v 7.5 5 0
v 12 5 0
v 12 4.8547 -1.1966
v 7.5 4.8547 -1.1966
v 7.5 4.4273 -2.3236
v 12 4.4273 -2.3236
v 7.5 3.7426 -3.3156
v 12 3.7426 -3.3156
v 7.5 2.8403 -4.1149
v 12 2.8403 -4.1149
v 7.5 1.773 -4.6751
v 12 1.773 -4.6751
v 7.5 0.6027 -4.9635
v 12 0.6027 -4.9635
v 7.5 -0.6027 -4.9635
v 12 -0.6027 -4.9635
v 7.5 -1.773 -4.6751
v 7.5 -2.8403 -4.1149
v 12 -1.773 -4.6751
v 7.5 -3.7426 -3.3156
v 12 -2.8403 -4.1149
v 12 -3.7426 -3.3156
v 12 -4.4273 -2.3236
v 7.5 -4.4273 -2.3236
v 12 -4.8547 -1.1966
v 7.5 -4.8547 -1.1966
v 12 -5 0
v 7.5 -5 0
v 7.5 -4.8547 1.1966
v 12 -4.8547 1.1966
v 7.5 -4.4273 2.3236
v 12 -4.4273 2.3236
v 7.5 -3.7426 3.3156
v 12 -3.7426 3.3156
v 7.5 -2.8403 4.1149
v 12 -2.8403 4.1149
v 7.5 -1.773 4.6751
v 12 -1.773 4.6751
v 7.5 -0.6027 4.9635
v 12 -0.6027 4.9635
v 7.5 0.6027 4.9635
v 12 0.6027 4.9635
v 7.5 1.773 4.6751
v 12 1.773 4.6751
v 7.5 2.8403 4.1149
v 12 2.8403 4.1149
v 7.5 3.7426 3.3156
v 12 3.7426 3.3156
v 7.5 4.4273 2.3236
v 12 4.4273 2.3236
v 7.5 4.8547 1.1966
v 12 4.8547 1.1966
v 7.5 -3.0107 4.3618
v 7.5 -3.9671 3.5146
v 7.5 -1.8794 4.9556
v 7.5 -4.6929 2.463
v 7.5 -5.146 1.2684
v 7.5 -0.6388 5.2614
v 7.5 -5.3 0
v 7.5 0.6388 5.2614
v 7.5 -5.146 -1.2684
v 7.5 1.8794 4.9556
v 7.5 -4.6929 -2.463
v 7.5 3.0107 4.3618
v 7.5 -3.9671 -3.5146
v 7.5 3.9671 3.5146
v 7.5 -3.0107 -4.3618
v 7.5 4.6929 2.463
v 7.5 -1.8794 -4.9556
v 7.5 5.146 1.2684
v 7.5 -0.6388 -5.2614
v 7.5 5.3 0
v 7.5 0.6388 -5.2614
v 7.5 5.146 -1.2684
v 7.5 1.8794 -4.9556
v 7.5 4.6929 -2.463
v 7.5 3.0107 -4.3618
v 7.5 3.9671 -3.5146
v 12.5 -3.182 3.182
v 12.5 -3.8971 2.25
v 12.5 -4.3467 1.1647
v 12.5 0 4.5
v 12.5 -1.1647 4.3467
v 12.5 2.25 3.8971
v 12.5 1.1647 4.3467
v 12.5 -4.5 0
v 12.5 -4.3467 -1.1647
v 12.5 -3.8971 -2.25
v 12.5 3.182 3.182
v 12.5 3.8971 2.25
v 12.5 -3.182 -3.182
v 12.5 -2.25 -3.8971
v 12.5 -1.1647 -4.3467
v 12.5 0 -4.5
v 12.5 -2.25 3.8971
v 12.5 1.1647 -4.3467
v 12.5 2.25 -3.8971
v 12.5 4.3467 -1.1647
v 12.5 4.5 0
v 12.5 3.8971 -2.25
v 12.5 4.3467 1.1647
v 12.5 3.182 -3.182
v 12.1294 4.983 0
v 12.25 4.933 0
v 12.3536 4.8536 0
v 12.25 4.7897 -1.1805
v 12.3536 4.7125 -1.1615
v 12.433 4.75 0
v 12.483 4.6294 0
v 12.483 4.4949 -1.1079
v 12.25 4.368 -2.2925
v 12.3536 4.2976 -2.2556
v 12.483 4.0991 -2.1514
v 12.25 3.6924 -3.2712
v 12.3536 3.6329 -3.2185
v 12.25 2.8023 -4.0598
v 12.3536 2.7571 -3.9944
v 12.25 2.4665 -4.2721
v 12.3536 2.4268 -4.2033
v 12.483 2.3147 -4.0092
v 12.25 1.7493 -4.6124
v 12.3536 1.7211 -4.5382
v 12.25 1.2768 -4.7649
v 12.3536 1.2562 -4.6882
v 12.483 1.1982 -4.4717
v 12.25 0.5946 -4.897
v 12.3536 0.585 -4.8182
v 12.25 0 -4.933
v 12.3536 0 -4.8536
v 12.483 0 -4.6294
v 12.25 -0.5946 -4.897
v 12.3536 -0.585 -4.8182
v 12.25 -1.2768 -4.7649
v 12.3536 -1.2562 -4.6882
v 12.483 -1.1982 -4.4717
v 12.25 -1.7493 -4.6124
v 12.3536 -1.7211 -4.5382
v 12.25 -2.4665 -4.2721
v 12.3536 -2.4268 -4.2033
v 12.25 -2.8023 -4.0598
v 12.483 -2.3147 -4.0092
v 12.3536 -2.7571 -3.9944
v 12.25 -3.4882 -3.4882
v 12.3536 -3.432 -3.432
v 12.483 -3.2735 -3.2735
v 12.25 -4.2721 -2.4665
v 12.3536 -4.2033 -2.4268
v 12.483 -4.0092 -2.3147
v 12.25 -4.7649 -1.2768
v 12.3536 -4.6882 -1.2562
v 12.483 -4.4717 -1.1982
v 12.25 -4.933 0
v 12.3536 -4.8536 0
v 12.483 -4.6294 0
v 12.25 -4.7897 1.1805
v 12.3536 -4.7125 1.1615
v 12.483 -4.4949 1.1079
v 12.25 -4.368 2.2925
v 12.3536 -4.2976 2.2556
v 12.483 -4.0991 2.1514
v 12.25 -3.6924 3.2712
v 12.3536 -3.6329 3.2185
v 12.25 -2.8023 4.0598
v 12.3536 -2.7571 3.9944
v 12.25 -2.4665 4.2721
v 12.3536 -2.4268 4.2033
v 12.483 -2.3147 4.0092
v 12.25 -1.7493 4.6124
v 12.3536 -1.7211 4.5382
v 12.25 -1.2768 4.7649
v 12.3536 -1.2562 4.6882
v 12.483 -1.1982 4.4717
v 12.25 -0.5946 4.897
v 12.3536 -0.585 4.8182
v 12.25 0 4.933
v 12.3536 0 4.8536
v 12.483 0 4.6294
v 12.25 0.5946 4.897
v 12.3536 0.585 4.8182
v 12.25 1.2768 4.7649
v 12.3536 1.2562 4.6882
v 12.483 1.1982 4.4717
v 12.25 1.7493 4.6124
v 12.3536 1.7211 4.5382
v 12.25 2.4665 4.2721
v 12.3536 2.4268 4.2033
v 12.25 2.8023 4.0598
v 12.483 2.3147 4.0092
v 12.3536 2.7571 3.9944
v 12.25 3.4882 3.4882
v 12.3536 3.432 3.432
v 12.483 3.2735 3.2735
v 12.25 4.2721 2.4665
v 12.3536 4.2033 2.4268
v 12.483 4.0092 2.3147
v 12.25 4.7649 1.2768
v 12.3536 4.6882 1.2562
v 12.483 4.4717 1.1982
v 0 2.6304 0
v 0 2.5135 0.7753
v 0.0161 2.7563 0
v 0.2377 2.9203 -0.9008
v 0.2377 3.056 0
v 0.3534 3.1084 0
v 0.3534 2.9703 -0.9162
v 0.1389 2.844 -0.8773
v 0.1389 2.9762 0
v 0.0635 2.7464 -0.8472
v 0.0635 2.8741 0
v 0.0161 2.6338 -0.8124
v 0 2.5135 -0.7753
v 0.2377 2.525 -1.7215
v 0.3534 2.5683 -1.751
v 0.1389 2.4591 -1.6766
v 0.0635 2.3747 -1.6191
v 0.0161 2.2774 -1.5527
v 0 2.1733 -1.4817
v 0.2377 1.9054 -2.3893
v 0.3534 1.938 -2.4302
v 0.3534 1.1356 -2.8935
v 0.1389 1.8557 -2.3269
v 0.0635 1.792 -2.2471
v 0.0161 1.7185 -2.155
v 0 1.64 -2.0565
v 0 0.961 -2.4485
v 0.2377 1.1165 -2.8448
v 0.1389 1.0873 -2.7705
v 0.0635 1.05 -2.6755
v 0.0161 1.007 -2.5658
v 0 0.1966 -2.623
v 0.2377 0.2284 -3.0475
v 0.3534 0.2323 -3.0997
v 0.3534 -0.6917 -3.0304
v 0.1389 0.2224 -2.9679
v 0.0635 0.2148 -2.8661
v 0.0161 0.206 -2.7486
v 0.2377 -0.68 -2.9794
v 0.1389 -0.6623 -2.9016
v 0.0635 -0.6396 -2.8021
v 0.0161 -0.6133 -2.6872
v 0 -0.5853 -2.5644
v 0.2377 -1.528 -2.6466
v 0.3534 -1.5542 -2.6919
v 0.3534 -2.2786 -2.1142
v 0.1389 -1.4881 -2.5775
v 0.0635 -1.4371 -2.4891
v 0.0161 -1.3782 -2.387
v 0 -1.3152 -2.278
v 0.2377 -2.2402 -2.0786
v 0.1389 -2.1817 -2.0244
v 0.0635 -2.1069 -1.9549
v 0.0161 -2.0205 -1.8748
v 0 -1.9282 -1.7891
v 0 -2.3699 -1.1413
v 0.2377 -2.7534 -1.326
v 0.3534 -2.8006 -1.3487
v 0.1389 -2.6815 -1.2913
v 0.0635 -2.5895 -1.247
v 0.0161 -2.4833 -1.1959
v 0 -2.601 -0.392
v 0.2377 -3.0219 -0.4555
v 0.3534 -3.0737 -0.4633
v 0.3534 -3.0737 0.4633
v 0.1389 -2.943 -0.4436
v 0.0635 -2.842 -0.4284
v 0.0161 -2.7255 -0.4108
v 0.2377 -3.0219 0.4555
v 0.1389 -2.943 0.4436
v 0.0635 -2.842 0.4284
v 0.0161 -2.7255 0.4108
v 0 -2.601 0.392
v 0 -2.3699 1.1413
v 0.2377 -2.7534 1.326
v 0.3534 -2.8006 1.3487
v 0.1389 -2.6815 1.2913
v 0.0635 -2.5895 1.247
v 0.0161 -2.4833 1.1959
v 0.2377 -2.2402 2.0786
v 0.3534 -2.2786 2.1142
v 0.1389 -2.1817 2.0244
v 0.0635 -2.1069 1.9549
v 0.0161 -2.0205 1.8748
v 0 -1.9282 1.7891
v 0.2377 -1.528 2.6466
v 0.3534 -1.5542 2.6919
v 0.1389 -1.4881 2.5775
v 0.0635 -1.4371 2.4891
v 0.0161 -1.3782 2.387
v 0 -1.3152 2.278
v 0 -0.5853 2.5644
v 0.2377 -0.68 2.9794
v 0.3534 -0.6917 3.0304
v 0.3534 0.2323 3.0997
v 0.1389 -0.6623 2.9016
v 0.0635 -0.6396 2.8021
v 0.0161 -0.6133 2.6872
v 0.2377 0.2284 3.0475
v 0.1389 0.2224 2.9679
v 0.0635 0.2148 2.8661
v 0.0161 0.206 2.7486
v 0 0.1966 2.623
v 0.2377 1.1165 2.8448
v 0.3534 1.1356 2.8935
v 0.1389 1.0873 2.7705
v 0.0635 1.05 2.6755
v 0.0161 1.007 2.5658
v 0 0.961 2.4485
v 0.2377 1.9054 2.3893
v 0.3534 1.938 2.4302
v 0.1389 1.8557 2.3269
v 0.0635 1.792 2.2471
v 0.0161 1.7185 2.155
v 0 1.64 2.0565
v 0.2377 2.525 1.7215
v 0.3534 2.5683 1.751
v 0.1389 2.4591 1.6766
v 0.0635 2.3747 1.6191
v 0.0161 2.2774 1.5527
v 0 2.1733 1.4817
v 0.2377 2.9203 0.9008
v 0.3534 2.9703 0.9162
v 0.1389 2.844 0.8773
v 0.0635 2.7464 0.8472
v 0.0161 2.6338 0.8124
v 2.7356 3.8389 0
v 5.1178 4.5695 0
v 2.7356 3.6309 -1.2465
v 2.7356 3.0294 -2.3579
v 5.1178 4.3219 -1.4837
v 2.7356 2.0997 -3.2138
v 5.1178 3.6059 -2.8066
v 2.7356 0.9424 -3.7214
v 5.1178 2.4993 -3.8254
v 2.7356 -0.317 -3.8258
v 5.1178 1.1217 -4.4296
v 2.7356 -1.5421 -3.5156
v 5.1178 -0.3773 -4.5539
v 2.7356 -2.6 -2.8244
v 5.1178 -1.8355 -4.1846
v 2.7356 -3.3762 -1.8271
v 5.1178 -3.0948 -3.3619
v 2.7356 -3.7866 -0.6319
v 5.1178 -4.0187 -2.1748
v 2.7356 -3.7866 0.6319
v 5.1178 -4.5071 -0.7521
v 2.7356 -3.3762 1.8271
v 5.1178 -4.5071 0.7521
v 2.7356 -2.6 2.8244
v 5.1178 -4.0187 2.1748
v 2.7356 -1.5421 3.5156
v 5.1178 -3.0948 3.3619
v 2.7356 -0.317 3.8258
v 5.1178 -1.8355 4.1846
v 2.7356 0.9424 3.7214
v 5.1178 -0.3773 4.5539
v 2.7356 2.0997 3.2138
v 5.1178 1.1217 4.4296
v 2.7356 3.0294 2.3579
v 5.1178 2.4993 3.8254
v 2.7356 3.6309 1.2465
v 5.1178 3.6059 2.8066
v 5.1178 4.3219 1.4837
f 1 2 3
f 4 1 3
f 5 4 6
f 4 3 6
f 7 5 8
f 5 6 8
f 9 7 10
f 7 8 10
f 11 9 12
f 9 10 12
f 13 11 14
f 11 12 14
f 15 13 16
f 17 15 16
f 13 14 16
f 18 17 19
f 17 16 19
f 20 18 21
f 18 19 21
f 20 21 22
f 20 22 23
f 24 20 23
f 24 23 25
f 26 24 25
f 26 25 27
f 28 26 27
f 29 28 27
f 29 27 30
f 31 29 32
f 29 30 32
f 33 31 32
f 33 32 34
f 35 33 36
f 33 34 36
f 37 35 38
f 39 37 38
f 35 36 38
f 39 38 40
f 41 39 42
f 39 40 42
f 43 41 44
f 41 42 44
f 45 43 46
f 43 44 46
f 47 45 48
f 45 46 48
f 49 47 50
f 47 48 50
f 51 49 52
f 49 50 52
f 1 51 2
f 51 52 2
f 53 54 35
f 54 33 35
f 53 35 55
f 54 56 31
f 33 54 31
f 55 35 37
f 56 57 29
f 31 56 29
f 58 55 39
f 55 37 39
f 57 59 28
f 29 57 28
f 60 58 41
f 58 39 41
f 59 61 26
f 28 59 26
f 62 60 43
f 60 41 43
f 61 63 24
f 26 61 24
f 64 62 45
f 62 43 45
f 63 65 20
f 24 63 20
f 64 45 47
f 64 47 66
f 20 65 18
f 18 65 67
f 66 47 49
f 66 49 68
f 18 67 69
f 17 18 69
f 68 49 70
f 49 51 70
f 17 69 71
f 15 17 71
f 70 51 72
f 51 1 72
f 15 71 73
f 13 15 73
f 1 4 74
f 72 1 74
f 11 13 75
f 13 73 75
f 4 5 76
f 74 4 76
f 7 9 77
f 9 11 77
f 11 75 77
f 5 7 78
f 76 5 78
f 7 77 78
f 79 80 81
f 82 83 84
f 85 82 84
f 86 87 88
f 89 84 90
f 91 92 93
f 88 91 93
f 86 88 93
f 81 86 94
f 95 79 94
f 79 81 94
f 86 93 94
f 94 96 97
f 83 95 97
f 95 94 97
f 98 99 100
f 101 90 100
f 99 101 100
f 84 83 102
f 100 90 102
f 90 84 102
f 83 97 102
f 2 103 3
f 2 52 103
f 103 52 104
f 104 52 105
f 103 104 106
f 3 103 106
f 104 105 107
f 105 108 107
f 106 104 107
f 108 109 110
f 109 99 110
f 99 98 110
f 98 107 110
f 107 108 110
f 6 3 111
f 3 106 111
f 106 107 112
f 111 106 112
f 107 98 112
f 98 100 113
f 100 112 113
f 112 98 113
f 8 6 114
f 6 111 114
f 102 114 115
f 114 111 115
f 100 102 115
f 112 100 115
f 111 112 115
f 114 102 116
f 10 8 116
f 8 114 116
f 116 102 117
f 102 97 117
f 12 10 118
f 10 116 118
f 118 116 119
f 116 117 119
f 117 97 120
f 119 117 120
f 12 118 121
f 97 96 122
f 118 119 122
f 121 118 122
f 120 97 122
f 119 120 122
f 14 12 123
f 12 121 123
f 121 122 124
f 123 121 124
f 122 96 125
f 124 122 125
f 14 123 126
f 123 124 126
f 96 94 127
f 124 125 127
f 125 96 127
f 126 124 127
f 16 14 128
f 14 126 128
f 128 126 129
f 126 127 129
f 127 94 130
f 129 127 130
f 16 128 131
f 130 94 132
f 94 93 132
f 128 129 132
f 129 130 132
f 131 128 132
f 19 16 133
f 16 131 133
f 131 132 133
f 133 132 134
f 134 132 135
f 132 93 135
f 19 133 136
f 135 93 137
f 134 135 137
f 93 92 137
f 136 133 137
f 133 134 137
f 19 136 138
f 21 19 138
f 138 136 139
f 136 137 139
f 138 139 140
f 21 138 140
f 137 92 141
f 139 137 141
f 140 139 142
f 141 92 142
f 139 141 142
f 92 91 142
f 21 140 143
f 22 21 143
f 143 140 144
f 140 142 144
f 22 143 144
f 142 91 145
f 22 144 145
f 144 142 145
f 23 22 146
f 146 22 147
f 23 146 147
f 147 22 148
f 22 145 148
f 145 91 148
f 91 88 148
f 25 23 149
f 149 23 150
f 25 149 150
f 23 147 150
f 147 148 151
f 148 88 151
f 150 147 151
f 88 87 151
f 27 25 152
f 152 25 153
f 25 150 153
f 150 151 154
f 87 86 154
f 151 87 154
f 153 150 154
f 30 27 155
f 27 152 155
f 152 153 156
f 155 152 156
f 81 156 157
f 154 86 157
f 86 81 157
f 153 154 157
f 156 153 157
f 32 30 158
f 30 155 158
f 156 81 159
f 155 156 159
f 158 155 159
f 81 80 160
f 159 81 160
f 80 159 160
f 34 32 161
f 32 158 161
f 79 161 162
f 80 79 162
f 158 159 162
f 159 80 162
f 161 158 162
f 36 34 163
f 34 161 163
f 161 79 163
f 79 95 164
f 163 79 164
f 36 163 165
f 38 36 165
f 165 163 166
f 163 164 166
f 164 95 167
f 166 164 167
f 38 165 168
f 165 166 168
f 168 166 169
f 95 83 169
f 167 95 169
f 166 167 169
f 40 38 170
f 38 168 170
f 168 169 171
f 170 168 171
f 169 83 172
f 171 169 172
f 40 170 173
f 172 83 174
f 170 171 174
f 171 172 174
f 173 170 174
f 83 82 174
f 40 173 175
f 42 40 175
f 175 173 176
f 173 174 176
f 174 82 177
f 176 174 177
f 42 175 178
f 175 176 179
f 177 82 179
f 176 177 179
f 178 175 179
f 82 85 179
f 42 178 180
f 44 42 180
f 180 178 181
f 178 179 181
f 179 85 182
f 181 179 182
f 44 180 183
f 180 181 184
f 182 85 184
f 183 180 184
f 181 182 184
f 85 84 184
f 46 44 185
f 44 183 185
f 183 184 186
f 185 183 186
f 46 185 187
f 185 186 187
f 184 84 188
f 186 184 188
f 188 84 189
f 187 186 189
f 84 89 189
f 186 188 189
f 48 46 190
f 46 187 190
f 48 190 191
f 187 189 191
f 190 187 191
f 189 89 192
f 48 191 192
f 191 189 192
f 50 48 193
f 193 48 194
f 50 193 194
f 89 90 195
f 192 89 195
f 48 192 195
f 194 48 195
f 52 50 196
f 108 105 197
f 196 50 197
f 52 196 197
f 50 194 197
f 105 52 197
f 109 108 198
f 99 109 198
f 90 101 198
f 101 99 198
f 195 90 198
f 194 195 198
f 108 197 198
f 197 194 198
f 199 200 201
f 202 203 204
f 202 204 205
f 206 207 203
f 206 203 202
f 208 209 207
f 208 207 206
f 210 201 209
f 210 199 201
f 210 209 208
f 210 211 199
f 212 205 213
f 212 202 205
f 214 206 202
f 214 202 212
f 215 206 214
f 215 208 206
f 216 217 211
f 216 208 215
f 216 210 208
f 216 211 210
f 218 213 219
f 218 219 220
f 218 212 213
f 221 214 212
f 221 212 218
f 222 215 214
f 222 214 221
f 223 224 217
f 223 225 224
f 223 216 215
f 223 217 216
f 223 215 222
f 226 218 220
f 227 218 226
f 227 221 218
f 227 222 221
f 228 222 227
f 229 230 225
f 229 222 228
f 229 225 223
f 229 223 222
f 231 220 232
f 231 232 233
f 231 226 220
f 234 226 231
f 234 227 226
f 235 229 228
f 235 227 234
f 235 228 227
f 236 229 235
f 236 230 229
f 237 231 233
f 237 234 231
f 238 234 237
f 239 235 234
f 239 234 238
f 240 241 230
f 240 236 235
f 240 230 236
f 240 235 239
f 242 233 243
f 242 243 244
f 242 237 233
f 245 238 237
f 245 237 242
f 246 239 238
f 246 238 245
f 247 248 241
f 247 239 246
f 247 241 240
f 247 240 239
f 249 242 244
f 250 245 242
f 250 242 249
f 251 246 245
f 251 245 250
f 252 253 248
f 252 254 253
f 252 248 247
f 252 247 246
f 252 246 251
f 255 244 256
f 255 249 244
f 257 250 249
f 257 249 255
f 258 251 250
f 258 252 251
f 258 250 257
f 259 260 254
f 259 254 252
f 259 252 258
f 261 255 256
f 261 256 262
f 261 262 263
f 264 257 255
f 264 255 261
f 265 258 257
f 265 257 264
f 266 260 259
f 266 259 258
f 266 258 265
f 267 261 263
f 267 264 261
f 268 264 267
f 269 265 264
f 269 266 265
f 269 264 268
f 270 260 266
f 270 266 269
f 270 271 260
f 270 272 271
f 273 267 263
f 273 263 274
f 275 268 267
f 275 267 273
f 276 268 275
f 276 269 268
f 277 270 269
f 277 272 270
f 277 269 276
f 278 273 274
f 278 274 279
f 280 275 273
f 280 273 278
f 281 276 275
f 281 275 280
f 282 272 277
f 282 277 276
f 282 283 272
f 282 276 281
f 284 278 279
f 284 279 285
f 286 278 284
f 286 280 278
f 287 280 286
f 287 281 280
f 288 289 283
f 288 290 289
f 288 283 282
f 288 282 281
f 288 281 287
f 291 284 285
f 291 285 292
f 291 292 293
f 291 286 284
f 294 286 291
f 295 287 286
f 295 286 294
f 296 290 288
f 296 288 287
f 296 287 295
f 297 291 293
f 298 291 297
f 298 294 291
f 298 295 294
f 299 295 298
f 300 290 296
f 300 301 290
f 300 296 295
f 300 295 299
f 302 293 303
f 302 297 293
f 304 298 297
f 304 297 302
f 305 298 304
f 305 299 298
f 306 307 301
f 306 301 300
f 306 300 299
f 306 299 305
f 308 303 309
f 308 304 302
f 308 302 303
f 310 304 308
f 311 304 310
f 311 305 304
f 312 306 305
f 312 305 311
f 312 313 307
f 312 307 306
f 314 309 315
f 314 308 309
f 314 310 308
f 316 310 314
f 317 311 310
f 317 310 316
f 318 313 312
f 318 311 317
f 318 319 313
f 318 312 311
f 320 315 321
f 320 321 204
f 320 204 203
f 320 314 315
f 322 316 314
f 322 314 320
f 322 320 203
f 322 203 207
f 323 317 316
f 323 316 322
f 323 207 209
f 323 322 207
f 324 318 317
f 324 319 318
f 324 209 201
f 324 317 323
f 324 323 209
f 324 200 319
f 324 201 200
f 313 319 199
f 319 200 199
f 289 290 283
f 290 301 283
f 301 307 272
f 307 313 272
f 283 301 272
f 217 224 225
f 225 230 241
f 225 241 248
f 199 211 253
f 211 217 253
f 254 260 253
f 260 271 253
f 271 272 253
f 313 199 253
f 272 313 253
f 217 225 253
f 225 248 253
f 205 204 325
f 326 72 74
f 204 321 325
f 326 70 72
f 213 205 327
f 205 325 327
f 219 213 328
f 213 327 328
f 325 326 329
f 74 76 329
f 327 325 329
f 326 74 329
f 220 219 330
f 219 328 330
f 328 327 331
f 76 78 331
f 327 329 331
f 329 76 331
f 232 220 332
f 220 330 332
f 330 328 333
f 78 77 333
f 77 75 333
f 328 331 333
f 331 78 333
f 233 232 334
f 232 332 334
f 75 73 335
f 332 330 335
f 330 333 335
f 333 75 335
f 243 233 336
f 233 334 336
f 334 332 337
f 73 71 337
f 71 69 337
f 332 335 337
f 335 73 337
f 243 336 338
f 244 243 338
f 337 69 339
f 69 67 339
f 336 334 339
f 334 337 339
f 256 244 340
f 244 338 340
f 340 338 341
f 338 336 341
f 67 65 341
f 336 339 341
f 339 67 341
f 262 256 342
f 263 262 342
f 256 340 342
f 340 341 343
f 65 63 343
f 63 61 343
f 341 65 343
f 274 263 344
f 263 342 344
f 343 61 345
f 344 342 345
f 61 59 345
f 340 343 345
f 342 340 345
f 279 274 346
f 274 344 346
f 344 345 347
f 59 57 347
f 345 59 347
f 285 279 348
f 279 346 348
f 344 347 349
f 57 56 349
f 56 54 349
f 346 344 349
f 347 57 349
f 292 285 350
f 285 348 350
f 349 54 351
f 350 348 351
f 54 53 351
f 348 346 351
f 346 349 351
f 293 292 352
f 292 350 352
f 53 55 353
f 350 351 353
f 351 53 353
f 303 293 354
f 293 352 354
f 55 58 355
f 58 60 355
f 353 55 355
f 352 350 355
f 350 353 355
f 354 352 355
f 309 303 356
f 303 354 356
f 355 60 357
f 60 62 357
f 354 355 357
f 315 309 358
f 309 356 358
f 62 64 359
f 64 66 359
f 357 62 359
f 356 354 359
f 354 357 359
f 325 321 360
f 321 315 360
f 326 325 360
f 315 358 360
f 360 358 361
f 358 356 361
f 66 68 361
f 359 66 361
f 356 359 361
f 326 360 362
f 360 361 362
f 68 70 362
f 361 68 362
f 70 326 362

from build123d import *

# Parameters (mm, degrees)
FILETE1_R = 0.5
FILETE2_R = 0.5


with BuildPart() as part:
    # Esboço1 → Revolução1 (revolve)
    with BuildSketch(Plane.XY):
        Polygon((0, 0), (0, 3), (7.5, 5.3), (7.5, 5), (12.5, 5), (12.5, 0), align=None)
    revolve(axis=Axis((12.5, 0, 0), (-1, 0, 0)))

    # Filete1
    filete1_edges = [part.edges().sort_by_distance(p)[0] for p in [
        (12.5, -5, 0),
    ]]
    fillet(filete1_edges, radius=FILETE1_R)

    # Filete2
    filete2_edges = [part.edges().sort_by_distance(p)[0] for p in [
        (0, -3, 0),
    ]]
    fillet(filete2_edges, radius=FILETE2_R)


solid = part.part
